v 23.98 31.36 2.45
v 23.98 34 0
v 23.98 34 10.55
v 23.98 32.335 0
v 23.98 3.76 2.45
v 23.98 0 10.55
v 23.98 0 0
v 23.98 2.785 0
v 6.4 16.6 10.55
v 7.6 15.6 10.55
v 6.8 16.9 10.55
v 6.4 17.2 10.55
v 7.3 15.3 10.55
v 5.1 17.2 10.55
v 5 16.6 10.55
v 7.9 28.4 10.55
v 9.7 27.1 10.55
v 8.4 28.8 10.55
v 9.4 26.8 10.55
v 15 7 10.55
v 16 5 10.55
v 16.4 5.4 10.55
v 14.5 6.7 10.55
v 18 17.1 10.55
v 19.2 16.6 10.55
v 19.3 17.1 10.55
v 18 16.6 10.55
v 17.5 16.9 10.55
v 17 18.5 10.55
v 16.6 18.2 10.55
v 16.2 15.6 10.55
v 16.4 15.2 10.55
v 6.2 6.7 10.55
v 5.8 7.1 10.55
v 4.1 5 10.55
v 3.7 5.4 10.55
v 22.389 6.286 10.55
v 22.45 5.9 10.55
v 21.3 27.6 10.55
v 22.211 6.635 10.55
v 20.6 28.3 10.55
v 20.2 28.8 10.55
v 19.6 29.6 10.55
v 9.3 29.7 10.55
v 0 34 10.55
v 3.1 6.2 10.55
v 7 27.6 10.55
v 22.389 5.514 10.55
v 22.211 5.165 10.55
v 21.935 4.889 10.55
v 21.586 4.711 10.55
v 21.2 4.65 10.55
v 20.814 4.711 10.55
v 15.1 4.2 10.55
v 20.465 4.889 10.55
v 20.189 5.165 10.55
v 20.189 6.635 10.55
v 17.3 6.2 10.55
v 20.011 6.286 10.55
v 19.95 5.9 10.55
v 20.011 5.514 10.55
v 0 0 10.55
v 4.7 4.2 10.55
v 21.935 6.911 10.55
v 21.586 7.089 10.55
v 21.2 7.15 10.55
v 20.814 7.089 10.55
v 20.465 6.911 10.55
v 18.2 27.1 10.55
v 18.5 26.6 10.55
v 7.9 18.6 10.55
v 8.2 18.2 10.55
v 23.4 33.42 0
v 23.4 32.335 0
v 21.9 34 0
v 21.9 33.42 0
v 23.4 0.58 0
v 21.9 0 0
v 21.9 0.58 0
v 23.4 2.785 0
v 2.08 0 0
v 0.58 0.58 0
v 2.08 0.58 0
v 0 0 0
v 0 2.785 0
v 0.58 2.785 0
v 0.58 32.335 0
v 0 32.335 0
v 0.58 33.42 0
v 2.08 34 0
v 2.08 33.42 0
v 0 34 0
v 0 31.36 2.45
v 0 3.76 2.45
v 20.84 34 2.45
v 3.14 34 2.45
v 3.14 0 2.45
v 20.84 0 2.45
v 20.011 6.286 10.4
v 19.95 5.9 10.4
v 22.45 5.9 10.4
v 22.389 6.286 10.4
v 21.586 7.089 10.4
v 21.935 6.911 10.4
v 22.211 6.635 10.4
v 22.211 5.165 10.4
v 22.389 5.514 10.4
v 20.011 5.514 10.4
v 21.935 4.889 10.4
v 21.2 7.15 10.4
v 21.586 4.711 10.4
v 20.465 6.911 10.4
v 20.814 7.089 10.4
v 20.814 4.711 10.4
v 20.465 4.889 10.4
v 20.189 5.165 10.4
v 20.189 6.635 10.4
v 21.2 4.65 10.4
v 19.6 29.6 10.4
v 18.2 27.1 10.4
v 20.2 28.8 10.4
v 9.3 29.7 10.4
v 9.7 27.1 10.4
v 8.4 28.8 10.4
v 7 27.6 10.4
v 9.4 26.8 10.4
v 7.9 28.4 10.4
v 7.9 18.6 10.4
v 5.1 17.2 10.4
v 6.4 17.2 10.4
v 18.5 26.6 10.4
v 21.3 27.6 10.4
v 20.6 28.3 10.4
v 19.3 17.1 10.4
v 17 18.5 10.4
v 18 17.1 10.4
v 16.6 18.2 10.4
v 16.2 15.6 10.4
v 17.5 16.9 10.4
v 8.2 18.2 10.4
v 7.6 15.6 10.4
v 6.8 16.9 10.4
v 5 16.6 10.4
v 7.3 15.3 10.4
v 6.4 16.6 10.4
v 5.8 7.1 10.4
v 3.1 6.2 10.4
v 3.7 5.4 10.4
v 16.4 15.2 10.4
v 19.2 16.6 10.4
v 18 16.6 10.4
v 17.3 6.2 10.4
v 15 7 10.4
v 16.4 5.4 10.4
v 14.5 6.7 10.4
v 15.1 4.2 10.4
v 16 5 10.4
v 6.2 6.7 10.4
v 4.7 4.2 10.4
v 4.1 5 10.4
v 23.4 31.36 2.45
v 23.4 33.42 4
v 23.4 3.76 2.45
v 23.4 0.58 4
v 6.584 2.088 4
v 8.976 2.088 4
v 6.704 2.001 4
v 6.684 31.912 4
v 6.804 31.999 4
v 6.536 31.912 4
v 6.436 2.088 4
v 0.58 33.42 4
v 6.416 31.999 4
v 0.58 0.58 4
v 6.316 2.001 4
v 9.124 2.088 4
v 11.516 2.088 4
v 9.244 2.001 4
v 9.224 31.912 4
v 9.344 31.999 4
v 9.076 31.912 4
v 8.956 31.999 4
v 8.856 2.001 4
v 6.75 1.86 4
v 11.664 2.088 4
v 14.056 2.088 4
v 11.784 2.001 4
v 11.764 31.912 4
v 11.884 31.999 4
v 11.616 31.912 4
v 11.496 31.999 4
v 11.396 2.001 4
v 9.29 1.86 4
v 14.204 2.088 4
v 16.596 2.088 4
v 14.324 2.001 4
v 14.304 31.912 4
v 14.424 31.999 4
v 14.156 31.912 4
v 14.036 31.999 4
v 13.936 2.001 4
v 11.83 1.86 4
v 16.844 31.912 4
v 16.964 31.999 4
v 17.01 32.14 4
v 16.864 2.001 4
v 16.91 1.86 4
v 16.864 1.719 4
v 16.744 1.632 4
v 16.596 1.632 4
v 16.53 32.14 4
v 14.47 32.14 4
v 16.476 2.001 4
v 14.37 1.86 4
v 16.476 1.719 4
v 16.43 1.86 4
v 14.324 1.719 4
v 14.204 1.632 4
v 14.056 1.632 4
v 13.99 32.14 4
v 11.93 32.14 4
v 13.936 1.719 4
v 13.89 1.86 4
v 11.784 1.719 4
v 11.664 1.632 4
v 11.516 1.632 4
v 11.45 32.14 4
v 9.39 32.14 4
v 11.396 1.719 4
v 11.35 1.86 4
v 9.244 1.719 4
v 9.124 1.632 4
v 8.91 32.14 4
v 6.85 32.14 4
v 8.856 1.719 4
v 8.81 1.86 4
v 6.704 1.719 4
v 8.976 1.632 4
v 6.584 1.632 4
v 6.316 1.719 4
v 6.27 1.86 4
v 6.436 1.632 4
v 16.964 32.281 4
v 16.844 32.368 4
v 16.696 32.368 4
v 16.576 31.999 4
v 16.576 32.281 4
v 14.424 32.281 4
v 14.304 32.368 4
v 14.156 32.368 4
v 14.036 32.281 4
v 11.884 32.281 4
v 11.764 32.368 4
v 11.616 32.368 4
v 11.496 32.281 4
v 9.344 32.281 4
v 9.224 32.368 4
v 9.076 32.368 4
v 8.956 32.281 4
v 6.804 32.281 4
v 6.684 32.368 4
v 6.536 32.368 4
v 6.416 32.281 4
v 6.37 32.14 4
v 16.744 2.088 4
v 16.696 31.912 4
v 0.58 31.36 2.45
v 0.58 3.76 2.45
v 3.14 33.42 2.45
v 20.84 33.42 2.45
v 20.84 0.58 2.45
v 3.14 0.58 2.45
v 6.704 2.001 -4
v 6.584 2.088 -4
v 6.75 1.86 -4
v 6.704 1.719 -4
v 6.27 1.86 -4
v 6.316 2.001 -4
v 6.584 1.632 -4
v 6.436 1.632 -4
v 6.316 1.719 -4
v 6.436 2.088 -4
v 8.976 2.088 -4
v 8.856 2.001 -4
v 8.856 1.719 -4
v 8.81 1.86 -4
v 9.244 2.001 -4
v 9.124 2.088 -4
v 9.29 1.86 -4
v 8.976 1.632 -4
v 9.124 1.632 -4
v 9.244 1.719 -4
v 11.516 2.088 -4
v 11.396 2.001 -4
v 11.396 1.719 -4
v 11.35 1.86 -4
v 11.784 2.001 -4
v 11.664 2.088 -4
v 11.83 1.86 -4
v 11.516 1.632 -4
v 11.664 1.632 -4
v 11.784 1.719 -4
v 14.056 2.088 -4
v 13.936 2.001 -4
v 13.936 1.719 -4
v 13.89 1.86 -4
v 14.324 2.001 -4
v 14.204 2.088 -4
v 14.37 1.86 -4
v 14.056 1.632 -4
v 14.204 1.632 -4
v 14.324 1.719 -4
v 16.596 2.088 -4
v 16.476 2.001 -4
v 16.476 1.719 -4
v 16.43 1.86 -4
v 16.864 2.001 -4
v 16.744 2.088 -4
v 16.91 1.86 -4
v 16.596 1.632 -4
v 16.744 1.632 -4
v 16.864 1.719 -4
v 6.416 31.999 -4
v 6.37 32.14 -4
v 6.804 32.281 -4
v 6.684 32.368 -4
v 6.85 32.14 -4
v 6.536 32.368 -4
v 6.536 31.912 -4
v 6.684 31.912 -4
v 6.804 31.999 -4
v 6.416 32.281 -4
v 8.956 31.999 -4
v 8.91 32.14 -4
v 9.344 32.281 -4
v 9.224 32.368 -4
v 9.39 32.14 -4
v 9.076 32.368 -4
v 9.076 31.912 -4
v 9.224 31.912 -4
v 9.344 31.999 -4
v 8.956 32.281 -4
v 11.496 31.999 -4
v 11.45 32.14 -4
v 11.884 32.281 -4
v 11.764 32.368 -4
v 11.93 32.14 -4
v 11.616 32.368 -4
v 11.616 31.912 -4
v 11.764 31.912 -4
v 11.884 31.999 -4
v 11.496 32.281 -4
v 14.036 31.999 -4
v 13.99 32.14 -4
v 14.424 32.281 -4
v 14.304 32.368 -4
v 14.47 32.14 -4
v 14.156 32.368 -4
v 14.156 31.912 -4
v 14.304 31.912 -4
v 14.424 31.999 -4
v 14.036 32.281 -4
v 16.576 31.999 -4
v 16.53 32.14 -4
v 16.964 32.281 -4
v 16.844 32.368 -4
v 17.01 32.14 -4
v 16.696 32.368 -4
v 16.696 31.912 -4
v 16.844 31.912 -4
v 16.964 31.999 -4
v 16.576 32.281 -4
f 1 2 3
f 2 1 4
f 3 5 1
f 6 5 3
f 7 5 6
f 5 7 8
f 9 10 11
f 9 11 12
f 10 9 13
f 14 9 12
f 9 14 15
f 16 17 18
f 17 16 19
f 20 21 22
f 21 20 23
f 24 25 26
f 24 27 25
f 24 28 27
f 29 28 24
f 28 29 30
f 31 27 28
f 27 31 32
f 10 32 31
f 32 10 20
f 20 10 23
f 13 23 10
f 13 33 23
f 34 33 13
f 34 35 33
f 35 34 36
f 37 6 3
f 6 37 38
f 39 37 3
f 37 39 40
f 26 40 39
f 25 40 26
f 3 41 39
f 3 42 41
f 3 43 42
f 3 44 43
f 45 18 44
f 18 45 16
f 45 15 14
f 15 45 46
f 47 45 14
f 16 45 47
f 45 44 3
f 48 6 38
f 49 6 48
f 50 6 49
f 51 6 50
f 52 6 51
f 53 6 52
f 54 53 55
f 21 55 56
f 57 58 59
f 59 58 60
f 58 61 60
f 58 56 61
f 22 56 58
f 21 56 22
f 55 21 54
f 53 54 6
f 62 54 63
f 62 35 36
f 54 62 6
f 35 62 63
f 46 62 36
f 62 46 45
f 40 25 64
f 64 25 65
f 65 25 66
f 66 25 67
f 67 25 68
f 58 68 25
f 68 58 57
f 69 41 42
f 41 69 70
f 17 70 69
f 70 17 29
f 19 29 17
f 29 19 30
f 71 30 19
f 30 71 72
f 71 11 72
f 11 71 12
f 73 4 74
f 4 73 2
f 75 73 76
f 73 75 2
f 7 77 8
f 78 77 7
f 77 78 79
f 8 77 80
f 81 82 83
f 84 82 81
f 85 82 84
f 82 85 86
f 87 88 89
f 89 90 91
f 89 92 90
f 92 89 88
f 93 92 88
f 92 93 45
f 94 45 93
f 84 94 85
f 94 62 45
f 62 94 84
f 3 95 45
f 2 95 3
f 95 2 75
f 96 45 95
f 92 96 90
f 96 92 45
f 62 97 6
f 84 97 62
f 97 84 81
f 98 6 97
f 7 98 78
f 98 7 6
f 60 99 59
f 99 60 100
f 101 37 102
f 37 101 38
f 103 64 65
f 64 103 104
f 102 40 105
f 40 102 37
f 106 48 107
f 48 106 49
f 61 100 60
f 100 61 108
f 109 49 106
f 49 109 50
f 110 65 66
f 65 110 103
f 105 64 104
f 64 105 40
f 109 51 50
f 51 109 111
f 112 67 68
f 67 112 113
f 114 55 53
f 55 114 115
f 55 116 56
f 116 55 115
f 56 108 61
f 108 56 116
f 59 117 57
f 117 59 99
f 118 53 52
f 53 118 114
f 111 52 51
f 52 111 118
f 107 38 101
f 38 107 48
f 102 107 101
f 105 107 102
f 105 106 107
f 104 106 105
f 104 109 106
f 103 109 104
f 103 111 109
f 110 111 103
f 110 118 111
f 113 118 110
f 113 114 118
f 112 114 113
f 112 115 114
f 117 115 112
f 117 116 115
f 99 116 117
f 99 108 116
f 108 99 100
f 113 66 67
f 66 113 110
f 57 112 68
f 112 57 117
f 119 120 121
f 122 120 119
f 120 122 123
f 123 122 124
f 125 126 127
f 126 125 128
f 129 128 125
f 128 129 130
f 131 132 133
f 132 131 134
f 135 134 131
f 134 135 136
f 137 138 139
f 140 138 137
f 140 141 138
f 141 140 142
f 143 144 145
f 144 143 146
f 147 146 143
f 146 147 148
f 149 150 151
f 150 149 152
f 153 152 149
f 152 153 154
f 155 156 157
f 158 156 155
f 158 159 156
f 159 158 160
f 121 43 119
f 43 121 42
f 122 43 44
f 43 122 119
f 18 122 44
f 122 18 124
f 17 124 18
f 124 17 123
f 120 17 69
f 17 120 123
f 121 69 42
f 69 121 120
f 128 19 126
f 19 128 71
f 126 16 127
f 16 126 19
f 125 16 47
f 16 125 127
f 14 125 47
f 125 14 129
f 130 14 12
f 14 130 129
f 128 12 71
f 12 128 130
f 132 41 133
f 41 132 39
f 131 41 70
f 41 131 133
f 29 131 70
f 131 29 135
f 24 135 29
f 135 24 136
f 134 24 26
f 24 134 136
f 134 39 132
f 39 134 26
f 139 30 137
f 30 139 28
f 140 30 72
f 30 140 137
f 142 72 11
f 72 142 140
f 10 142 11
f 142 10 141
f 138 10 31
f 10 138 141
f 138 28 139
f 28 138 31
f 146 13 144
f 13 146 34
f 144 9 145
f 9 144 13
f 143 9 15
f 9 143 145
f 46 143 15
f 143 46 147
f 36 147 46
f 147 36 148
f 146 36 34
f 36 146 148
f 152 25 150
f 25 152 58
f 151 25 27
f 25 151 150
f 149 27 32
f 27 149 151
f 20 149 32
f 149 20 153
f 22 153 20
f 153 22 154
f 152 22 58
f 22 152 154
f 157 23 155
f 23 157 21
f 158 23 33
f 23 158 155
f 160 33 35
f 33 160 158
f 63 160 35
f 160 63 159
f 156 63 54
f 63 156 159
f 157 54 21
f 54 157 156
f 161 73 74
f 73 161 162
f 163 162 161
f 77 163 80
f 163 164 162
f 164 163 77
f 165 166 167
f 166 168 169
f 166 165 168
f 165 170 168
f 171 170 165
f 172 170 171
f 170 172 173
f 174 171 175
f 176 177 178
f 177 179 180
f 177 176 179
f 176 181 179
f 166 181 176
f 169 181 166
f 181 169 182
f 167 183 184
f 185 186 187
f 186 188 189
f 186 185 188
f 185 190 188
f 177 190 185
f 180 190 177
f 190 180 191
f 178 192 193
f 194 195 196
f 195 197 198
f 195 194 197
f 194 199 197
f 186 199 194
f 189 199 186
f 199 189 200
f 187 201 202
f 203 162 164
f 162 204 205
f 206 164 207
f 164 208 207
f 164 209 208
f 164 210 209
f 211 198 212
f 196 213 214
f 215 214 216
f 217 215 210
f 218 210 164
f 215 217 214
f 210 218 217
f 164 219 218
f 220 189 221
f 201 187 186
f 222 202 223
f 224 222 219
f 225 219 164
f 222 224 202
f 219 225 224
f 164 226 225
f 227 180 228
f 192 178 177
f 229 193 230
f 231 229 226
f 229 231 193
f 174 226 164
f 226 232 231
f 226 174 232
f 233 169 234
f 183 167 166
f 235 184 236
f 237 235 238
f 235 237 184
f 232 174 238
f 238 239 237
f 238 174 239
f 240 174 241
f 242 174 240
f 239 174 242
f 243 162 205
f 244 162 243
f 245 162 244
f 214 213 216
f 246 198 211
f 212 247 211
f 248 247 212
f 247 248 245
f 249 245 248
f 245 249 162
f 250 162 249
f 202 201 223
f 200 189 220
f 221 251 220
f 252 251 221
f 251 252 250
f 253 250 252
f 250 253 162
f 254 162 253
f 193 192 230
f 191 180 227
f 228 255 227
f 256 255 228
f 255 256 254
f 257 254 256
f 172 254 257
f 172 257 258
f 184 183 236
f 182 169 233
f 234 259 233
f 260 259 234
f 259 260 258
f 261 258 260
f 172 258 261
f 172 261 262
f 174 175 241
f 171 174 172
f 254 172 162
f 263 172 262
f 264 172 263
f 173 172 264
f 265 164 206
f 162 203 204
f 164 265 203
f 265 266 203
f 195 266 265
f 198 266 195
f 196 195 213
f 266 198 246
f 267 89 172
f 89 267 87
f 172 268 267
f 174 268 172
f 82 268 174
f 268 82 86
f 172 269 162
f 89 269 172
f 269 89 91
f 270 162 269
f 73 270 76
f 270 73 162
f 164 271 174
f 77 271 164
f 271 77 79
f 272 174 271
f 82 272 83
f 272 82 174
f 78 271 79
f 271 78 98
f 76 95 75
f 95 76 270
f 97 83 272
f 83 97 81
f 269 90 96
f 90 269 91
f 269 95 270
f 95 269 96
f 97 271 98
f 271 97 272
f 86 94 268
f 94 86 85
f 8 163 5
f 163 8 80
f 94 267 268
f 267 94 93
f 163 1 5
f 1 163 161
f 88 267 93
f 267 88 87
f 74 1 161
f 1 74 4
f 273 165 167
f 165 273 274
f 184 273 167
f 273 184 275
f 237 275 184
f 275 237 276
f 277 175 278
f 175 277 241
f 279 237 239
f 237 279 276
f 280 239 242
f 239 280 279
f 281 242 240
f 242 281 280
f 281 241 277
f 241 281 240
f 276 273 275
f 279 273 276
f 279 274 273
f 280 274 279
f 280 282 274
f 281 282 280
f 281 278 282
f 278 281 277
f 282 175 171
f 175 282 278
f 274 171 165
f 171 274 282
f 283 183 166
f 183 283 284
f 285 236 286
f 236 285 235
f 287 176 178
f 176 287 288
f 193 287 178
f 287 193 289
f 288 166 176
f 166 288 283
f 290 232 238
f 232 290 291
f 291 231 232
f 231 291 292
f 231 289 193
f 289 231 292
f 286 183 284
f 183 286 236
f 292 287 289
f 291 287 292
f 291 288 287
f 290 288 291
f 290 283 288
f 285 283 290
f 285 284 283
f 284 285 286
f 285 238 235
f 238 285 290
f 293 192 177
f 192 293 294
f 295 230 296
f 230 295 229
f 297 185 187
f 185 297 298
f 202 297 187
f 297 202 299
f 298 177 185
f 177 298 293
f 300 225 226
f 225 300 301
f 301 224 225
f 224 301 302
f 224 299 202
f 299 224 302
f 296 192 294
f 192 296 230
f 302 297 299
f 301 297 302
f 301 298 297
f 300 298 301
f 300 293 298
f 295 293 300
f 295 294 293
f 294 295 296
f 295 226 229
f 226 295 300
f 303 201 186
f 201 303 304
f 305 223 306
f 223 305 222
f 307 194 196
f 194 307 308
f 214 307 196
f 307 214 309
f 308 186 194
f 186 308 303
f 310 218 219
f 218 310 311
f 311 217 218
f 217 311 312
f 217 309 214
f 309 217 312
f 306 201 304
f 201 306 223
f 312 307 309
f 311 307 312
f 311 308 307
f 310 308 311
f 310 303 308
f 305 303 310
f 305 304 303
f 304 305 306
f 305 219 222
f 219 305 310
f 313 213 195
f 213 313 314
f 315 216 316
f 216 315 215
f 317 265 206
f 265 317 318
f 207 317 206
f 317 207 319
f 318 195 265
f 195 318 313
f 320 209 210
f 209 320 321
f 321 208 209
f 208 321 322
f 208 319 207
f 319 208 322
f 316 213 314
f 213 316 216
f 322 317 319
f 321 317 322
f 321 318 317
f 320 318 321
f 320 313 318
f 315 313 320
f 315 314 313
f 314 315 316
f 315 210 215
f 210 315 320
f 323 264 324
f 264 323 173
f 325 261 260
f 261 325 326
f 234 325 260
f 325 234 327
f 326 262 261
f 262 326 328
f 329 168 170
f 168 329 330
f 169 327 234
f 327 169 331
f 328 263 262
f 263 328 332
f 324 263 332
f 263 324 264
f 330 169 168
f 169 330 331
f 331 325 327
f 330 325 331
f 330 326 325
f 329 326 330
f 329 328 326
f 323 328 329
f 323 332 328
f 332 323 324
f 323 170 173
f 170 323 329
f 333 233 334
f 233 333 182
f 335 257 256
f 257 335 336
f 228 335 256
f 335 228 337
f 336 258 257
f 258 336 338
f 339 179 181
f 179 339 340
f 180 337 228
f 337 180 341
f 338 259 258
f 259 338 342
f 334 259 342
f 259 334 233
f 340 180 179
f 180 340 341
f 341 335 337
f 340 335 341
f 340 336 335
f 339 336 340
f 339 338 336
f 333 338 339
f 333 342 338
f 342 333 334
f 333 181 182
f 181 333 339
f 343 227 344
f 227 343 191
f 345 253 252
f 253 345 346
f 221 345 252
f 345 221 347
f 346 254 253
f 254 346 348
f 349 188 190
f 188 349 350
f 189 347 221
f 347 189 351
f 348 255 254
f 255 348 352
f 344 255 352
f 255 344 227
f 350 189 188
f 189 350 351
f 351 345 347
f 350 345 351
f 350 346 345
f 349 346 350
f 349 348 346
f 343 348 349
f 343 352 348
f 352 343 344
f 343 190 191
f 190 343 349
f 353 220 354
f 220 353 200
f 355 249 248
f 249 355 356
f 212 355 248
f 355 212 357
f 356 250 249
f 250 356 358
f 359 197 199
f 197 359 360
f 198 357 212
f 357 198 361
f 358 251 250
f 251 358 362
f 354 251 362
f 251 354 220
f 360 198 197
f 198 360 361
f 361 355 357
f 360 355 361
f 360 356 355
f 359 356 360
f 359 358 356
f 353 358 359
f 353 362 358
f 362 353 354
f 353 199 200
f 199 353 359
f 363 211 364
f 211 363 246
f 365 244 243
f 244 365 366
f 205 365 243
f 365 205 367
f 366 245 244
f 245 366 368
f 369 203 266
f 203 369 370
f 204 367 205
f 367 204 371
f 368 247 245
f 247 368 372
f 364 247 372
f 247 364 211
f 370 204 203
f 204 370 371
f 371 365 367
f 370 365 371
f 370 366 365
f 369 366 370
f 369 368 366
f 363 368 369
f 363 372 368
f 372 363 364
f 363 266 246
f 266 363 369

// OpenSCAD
w = 23.98;
h = 34;
d = 10.55;

t = 0.58;
u= d-8.1+1.55;

difference(){

    cube( [w,h,d] );

    //translate([0,0,11]) scale([w/211,h/299,-0.01]) %surface("7SegDigit-300.png");
    

    translate([21.2,5.9,10.4])
    scale([1.25,1.25,1])
    cylinder($fn=20);
    
    translate([0,0,10.4])
    linear_extrude(height=1)
    scale(0.1) {
        polygon([[47,42],[151,42],[160,50],[145,67],[62,67],[41,50]]);
        
        polygon([[37,54],[31,62],[50,166],[64,166],[73,153],[58,71]]);
        
        polygon([[164,54],[150,70],[164,152],[180,166],[192,166],[173,62]]);
        
        polygon([[76,156],[162,156],[175,169],[166,182],[82,182],[68,169]]);
        
        polygon([[51,172],[64,172],[79,186],[94,268],[79,284],[70,276]]);
        
        polygon([[180,171],[193,171],[213,276],[206,283],[185,266],[170,185]]);

        polygon([[97,271],[182,271],[202,288],[196,296],[93,297],[84,288]]);
        
    }
    
    translate([t,t,0])
    cube([w-2*t,h-2*t,u]);
    
    cutout1();
    cutout2();
}



module cutout1() {
    wt=17.7;
    wb=19.82;
    wc=(wb-wt)/2;
    wd=d-8.1;

    we = (w-wb)/2;
    
    
    translate([we,80,0])
    rotate([90,0,0])
    linear_extrude() polygon([[0,0],[wb,0],[wt+wc,wd],[wc,wd]]);
}

module cutout2() {
    wt=27.6;
    wb=29.55;
    wc=(wb-wt)/2;
    wd=d-8.1;

    we = (w-wb)/2;
    
    
    translate([-10,-we,0])
    rotate([90,0,90])
    linear_extrude() polygon([[0,0],[wb,0],[wt+wc,wd],[wc,wd]]);
}


pinr=0.48/2;

module pin(x,y){
    translate([x,y,u-8])

    cylinder(r=pinr,h=8,$fn=10);
}


for (i=[0:4])
    pin(6.75 -pinr + i*2.54, 2.1-pinr);


for (i=[0:4])
    pin( 6.85 -pinr + i*2.54, h-(2.1-pinr));
